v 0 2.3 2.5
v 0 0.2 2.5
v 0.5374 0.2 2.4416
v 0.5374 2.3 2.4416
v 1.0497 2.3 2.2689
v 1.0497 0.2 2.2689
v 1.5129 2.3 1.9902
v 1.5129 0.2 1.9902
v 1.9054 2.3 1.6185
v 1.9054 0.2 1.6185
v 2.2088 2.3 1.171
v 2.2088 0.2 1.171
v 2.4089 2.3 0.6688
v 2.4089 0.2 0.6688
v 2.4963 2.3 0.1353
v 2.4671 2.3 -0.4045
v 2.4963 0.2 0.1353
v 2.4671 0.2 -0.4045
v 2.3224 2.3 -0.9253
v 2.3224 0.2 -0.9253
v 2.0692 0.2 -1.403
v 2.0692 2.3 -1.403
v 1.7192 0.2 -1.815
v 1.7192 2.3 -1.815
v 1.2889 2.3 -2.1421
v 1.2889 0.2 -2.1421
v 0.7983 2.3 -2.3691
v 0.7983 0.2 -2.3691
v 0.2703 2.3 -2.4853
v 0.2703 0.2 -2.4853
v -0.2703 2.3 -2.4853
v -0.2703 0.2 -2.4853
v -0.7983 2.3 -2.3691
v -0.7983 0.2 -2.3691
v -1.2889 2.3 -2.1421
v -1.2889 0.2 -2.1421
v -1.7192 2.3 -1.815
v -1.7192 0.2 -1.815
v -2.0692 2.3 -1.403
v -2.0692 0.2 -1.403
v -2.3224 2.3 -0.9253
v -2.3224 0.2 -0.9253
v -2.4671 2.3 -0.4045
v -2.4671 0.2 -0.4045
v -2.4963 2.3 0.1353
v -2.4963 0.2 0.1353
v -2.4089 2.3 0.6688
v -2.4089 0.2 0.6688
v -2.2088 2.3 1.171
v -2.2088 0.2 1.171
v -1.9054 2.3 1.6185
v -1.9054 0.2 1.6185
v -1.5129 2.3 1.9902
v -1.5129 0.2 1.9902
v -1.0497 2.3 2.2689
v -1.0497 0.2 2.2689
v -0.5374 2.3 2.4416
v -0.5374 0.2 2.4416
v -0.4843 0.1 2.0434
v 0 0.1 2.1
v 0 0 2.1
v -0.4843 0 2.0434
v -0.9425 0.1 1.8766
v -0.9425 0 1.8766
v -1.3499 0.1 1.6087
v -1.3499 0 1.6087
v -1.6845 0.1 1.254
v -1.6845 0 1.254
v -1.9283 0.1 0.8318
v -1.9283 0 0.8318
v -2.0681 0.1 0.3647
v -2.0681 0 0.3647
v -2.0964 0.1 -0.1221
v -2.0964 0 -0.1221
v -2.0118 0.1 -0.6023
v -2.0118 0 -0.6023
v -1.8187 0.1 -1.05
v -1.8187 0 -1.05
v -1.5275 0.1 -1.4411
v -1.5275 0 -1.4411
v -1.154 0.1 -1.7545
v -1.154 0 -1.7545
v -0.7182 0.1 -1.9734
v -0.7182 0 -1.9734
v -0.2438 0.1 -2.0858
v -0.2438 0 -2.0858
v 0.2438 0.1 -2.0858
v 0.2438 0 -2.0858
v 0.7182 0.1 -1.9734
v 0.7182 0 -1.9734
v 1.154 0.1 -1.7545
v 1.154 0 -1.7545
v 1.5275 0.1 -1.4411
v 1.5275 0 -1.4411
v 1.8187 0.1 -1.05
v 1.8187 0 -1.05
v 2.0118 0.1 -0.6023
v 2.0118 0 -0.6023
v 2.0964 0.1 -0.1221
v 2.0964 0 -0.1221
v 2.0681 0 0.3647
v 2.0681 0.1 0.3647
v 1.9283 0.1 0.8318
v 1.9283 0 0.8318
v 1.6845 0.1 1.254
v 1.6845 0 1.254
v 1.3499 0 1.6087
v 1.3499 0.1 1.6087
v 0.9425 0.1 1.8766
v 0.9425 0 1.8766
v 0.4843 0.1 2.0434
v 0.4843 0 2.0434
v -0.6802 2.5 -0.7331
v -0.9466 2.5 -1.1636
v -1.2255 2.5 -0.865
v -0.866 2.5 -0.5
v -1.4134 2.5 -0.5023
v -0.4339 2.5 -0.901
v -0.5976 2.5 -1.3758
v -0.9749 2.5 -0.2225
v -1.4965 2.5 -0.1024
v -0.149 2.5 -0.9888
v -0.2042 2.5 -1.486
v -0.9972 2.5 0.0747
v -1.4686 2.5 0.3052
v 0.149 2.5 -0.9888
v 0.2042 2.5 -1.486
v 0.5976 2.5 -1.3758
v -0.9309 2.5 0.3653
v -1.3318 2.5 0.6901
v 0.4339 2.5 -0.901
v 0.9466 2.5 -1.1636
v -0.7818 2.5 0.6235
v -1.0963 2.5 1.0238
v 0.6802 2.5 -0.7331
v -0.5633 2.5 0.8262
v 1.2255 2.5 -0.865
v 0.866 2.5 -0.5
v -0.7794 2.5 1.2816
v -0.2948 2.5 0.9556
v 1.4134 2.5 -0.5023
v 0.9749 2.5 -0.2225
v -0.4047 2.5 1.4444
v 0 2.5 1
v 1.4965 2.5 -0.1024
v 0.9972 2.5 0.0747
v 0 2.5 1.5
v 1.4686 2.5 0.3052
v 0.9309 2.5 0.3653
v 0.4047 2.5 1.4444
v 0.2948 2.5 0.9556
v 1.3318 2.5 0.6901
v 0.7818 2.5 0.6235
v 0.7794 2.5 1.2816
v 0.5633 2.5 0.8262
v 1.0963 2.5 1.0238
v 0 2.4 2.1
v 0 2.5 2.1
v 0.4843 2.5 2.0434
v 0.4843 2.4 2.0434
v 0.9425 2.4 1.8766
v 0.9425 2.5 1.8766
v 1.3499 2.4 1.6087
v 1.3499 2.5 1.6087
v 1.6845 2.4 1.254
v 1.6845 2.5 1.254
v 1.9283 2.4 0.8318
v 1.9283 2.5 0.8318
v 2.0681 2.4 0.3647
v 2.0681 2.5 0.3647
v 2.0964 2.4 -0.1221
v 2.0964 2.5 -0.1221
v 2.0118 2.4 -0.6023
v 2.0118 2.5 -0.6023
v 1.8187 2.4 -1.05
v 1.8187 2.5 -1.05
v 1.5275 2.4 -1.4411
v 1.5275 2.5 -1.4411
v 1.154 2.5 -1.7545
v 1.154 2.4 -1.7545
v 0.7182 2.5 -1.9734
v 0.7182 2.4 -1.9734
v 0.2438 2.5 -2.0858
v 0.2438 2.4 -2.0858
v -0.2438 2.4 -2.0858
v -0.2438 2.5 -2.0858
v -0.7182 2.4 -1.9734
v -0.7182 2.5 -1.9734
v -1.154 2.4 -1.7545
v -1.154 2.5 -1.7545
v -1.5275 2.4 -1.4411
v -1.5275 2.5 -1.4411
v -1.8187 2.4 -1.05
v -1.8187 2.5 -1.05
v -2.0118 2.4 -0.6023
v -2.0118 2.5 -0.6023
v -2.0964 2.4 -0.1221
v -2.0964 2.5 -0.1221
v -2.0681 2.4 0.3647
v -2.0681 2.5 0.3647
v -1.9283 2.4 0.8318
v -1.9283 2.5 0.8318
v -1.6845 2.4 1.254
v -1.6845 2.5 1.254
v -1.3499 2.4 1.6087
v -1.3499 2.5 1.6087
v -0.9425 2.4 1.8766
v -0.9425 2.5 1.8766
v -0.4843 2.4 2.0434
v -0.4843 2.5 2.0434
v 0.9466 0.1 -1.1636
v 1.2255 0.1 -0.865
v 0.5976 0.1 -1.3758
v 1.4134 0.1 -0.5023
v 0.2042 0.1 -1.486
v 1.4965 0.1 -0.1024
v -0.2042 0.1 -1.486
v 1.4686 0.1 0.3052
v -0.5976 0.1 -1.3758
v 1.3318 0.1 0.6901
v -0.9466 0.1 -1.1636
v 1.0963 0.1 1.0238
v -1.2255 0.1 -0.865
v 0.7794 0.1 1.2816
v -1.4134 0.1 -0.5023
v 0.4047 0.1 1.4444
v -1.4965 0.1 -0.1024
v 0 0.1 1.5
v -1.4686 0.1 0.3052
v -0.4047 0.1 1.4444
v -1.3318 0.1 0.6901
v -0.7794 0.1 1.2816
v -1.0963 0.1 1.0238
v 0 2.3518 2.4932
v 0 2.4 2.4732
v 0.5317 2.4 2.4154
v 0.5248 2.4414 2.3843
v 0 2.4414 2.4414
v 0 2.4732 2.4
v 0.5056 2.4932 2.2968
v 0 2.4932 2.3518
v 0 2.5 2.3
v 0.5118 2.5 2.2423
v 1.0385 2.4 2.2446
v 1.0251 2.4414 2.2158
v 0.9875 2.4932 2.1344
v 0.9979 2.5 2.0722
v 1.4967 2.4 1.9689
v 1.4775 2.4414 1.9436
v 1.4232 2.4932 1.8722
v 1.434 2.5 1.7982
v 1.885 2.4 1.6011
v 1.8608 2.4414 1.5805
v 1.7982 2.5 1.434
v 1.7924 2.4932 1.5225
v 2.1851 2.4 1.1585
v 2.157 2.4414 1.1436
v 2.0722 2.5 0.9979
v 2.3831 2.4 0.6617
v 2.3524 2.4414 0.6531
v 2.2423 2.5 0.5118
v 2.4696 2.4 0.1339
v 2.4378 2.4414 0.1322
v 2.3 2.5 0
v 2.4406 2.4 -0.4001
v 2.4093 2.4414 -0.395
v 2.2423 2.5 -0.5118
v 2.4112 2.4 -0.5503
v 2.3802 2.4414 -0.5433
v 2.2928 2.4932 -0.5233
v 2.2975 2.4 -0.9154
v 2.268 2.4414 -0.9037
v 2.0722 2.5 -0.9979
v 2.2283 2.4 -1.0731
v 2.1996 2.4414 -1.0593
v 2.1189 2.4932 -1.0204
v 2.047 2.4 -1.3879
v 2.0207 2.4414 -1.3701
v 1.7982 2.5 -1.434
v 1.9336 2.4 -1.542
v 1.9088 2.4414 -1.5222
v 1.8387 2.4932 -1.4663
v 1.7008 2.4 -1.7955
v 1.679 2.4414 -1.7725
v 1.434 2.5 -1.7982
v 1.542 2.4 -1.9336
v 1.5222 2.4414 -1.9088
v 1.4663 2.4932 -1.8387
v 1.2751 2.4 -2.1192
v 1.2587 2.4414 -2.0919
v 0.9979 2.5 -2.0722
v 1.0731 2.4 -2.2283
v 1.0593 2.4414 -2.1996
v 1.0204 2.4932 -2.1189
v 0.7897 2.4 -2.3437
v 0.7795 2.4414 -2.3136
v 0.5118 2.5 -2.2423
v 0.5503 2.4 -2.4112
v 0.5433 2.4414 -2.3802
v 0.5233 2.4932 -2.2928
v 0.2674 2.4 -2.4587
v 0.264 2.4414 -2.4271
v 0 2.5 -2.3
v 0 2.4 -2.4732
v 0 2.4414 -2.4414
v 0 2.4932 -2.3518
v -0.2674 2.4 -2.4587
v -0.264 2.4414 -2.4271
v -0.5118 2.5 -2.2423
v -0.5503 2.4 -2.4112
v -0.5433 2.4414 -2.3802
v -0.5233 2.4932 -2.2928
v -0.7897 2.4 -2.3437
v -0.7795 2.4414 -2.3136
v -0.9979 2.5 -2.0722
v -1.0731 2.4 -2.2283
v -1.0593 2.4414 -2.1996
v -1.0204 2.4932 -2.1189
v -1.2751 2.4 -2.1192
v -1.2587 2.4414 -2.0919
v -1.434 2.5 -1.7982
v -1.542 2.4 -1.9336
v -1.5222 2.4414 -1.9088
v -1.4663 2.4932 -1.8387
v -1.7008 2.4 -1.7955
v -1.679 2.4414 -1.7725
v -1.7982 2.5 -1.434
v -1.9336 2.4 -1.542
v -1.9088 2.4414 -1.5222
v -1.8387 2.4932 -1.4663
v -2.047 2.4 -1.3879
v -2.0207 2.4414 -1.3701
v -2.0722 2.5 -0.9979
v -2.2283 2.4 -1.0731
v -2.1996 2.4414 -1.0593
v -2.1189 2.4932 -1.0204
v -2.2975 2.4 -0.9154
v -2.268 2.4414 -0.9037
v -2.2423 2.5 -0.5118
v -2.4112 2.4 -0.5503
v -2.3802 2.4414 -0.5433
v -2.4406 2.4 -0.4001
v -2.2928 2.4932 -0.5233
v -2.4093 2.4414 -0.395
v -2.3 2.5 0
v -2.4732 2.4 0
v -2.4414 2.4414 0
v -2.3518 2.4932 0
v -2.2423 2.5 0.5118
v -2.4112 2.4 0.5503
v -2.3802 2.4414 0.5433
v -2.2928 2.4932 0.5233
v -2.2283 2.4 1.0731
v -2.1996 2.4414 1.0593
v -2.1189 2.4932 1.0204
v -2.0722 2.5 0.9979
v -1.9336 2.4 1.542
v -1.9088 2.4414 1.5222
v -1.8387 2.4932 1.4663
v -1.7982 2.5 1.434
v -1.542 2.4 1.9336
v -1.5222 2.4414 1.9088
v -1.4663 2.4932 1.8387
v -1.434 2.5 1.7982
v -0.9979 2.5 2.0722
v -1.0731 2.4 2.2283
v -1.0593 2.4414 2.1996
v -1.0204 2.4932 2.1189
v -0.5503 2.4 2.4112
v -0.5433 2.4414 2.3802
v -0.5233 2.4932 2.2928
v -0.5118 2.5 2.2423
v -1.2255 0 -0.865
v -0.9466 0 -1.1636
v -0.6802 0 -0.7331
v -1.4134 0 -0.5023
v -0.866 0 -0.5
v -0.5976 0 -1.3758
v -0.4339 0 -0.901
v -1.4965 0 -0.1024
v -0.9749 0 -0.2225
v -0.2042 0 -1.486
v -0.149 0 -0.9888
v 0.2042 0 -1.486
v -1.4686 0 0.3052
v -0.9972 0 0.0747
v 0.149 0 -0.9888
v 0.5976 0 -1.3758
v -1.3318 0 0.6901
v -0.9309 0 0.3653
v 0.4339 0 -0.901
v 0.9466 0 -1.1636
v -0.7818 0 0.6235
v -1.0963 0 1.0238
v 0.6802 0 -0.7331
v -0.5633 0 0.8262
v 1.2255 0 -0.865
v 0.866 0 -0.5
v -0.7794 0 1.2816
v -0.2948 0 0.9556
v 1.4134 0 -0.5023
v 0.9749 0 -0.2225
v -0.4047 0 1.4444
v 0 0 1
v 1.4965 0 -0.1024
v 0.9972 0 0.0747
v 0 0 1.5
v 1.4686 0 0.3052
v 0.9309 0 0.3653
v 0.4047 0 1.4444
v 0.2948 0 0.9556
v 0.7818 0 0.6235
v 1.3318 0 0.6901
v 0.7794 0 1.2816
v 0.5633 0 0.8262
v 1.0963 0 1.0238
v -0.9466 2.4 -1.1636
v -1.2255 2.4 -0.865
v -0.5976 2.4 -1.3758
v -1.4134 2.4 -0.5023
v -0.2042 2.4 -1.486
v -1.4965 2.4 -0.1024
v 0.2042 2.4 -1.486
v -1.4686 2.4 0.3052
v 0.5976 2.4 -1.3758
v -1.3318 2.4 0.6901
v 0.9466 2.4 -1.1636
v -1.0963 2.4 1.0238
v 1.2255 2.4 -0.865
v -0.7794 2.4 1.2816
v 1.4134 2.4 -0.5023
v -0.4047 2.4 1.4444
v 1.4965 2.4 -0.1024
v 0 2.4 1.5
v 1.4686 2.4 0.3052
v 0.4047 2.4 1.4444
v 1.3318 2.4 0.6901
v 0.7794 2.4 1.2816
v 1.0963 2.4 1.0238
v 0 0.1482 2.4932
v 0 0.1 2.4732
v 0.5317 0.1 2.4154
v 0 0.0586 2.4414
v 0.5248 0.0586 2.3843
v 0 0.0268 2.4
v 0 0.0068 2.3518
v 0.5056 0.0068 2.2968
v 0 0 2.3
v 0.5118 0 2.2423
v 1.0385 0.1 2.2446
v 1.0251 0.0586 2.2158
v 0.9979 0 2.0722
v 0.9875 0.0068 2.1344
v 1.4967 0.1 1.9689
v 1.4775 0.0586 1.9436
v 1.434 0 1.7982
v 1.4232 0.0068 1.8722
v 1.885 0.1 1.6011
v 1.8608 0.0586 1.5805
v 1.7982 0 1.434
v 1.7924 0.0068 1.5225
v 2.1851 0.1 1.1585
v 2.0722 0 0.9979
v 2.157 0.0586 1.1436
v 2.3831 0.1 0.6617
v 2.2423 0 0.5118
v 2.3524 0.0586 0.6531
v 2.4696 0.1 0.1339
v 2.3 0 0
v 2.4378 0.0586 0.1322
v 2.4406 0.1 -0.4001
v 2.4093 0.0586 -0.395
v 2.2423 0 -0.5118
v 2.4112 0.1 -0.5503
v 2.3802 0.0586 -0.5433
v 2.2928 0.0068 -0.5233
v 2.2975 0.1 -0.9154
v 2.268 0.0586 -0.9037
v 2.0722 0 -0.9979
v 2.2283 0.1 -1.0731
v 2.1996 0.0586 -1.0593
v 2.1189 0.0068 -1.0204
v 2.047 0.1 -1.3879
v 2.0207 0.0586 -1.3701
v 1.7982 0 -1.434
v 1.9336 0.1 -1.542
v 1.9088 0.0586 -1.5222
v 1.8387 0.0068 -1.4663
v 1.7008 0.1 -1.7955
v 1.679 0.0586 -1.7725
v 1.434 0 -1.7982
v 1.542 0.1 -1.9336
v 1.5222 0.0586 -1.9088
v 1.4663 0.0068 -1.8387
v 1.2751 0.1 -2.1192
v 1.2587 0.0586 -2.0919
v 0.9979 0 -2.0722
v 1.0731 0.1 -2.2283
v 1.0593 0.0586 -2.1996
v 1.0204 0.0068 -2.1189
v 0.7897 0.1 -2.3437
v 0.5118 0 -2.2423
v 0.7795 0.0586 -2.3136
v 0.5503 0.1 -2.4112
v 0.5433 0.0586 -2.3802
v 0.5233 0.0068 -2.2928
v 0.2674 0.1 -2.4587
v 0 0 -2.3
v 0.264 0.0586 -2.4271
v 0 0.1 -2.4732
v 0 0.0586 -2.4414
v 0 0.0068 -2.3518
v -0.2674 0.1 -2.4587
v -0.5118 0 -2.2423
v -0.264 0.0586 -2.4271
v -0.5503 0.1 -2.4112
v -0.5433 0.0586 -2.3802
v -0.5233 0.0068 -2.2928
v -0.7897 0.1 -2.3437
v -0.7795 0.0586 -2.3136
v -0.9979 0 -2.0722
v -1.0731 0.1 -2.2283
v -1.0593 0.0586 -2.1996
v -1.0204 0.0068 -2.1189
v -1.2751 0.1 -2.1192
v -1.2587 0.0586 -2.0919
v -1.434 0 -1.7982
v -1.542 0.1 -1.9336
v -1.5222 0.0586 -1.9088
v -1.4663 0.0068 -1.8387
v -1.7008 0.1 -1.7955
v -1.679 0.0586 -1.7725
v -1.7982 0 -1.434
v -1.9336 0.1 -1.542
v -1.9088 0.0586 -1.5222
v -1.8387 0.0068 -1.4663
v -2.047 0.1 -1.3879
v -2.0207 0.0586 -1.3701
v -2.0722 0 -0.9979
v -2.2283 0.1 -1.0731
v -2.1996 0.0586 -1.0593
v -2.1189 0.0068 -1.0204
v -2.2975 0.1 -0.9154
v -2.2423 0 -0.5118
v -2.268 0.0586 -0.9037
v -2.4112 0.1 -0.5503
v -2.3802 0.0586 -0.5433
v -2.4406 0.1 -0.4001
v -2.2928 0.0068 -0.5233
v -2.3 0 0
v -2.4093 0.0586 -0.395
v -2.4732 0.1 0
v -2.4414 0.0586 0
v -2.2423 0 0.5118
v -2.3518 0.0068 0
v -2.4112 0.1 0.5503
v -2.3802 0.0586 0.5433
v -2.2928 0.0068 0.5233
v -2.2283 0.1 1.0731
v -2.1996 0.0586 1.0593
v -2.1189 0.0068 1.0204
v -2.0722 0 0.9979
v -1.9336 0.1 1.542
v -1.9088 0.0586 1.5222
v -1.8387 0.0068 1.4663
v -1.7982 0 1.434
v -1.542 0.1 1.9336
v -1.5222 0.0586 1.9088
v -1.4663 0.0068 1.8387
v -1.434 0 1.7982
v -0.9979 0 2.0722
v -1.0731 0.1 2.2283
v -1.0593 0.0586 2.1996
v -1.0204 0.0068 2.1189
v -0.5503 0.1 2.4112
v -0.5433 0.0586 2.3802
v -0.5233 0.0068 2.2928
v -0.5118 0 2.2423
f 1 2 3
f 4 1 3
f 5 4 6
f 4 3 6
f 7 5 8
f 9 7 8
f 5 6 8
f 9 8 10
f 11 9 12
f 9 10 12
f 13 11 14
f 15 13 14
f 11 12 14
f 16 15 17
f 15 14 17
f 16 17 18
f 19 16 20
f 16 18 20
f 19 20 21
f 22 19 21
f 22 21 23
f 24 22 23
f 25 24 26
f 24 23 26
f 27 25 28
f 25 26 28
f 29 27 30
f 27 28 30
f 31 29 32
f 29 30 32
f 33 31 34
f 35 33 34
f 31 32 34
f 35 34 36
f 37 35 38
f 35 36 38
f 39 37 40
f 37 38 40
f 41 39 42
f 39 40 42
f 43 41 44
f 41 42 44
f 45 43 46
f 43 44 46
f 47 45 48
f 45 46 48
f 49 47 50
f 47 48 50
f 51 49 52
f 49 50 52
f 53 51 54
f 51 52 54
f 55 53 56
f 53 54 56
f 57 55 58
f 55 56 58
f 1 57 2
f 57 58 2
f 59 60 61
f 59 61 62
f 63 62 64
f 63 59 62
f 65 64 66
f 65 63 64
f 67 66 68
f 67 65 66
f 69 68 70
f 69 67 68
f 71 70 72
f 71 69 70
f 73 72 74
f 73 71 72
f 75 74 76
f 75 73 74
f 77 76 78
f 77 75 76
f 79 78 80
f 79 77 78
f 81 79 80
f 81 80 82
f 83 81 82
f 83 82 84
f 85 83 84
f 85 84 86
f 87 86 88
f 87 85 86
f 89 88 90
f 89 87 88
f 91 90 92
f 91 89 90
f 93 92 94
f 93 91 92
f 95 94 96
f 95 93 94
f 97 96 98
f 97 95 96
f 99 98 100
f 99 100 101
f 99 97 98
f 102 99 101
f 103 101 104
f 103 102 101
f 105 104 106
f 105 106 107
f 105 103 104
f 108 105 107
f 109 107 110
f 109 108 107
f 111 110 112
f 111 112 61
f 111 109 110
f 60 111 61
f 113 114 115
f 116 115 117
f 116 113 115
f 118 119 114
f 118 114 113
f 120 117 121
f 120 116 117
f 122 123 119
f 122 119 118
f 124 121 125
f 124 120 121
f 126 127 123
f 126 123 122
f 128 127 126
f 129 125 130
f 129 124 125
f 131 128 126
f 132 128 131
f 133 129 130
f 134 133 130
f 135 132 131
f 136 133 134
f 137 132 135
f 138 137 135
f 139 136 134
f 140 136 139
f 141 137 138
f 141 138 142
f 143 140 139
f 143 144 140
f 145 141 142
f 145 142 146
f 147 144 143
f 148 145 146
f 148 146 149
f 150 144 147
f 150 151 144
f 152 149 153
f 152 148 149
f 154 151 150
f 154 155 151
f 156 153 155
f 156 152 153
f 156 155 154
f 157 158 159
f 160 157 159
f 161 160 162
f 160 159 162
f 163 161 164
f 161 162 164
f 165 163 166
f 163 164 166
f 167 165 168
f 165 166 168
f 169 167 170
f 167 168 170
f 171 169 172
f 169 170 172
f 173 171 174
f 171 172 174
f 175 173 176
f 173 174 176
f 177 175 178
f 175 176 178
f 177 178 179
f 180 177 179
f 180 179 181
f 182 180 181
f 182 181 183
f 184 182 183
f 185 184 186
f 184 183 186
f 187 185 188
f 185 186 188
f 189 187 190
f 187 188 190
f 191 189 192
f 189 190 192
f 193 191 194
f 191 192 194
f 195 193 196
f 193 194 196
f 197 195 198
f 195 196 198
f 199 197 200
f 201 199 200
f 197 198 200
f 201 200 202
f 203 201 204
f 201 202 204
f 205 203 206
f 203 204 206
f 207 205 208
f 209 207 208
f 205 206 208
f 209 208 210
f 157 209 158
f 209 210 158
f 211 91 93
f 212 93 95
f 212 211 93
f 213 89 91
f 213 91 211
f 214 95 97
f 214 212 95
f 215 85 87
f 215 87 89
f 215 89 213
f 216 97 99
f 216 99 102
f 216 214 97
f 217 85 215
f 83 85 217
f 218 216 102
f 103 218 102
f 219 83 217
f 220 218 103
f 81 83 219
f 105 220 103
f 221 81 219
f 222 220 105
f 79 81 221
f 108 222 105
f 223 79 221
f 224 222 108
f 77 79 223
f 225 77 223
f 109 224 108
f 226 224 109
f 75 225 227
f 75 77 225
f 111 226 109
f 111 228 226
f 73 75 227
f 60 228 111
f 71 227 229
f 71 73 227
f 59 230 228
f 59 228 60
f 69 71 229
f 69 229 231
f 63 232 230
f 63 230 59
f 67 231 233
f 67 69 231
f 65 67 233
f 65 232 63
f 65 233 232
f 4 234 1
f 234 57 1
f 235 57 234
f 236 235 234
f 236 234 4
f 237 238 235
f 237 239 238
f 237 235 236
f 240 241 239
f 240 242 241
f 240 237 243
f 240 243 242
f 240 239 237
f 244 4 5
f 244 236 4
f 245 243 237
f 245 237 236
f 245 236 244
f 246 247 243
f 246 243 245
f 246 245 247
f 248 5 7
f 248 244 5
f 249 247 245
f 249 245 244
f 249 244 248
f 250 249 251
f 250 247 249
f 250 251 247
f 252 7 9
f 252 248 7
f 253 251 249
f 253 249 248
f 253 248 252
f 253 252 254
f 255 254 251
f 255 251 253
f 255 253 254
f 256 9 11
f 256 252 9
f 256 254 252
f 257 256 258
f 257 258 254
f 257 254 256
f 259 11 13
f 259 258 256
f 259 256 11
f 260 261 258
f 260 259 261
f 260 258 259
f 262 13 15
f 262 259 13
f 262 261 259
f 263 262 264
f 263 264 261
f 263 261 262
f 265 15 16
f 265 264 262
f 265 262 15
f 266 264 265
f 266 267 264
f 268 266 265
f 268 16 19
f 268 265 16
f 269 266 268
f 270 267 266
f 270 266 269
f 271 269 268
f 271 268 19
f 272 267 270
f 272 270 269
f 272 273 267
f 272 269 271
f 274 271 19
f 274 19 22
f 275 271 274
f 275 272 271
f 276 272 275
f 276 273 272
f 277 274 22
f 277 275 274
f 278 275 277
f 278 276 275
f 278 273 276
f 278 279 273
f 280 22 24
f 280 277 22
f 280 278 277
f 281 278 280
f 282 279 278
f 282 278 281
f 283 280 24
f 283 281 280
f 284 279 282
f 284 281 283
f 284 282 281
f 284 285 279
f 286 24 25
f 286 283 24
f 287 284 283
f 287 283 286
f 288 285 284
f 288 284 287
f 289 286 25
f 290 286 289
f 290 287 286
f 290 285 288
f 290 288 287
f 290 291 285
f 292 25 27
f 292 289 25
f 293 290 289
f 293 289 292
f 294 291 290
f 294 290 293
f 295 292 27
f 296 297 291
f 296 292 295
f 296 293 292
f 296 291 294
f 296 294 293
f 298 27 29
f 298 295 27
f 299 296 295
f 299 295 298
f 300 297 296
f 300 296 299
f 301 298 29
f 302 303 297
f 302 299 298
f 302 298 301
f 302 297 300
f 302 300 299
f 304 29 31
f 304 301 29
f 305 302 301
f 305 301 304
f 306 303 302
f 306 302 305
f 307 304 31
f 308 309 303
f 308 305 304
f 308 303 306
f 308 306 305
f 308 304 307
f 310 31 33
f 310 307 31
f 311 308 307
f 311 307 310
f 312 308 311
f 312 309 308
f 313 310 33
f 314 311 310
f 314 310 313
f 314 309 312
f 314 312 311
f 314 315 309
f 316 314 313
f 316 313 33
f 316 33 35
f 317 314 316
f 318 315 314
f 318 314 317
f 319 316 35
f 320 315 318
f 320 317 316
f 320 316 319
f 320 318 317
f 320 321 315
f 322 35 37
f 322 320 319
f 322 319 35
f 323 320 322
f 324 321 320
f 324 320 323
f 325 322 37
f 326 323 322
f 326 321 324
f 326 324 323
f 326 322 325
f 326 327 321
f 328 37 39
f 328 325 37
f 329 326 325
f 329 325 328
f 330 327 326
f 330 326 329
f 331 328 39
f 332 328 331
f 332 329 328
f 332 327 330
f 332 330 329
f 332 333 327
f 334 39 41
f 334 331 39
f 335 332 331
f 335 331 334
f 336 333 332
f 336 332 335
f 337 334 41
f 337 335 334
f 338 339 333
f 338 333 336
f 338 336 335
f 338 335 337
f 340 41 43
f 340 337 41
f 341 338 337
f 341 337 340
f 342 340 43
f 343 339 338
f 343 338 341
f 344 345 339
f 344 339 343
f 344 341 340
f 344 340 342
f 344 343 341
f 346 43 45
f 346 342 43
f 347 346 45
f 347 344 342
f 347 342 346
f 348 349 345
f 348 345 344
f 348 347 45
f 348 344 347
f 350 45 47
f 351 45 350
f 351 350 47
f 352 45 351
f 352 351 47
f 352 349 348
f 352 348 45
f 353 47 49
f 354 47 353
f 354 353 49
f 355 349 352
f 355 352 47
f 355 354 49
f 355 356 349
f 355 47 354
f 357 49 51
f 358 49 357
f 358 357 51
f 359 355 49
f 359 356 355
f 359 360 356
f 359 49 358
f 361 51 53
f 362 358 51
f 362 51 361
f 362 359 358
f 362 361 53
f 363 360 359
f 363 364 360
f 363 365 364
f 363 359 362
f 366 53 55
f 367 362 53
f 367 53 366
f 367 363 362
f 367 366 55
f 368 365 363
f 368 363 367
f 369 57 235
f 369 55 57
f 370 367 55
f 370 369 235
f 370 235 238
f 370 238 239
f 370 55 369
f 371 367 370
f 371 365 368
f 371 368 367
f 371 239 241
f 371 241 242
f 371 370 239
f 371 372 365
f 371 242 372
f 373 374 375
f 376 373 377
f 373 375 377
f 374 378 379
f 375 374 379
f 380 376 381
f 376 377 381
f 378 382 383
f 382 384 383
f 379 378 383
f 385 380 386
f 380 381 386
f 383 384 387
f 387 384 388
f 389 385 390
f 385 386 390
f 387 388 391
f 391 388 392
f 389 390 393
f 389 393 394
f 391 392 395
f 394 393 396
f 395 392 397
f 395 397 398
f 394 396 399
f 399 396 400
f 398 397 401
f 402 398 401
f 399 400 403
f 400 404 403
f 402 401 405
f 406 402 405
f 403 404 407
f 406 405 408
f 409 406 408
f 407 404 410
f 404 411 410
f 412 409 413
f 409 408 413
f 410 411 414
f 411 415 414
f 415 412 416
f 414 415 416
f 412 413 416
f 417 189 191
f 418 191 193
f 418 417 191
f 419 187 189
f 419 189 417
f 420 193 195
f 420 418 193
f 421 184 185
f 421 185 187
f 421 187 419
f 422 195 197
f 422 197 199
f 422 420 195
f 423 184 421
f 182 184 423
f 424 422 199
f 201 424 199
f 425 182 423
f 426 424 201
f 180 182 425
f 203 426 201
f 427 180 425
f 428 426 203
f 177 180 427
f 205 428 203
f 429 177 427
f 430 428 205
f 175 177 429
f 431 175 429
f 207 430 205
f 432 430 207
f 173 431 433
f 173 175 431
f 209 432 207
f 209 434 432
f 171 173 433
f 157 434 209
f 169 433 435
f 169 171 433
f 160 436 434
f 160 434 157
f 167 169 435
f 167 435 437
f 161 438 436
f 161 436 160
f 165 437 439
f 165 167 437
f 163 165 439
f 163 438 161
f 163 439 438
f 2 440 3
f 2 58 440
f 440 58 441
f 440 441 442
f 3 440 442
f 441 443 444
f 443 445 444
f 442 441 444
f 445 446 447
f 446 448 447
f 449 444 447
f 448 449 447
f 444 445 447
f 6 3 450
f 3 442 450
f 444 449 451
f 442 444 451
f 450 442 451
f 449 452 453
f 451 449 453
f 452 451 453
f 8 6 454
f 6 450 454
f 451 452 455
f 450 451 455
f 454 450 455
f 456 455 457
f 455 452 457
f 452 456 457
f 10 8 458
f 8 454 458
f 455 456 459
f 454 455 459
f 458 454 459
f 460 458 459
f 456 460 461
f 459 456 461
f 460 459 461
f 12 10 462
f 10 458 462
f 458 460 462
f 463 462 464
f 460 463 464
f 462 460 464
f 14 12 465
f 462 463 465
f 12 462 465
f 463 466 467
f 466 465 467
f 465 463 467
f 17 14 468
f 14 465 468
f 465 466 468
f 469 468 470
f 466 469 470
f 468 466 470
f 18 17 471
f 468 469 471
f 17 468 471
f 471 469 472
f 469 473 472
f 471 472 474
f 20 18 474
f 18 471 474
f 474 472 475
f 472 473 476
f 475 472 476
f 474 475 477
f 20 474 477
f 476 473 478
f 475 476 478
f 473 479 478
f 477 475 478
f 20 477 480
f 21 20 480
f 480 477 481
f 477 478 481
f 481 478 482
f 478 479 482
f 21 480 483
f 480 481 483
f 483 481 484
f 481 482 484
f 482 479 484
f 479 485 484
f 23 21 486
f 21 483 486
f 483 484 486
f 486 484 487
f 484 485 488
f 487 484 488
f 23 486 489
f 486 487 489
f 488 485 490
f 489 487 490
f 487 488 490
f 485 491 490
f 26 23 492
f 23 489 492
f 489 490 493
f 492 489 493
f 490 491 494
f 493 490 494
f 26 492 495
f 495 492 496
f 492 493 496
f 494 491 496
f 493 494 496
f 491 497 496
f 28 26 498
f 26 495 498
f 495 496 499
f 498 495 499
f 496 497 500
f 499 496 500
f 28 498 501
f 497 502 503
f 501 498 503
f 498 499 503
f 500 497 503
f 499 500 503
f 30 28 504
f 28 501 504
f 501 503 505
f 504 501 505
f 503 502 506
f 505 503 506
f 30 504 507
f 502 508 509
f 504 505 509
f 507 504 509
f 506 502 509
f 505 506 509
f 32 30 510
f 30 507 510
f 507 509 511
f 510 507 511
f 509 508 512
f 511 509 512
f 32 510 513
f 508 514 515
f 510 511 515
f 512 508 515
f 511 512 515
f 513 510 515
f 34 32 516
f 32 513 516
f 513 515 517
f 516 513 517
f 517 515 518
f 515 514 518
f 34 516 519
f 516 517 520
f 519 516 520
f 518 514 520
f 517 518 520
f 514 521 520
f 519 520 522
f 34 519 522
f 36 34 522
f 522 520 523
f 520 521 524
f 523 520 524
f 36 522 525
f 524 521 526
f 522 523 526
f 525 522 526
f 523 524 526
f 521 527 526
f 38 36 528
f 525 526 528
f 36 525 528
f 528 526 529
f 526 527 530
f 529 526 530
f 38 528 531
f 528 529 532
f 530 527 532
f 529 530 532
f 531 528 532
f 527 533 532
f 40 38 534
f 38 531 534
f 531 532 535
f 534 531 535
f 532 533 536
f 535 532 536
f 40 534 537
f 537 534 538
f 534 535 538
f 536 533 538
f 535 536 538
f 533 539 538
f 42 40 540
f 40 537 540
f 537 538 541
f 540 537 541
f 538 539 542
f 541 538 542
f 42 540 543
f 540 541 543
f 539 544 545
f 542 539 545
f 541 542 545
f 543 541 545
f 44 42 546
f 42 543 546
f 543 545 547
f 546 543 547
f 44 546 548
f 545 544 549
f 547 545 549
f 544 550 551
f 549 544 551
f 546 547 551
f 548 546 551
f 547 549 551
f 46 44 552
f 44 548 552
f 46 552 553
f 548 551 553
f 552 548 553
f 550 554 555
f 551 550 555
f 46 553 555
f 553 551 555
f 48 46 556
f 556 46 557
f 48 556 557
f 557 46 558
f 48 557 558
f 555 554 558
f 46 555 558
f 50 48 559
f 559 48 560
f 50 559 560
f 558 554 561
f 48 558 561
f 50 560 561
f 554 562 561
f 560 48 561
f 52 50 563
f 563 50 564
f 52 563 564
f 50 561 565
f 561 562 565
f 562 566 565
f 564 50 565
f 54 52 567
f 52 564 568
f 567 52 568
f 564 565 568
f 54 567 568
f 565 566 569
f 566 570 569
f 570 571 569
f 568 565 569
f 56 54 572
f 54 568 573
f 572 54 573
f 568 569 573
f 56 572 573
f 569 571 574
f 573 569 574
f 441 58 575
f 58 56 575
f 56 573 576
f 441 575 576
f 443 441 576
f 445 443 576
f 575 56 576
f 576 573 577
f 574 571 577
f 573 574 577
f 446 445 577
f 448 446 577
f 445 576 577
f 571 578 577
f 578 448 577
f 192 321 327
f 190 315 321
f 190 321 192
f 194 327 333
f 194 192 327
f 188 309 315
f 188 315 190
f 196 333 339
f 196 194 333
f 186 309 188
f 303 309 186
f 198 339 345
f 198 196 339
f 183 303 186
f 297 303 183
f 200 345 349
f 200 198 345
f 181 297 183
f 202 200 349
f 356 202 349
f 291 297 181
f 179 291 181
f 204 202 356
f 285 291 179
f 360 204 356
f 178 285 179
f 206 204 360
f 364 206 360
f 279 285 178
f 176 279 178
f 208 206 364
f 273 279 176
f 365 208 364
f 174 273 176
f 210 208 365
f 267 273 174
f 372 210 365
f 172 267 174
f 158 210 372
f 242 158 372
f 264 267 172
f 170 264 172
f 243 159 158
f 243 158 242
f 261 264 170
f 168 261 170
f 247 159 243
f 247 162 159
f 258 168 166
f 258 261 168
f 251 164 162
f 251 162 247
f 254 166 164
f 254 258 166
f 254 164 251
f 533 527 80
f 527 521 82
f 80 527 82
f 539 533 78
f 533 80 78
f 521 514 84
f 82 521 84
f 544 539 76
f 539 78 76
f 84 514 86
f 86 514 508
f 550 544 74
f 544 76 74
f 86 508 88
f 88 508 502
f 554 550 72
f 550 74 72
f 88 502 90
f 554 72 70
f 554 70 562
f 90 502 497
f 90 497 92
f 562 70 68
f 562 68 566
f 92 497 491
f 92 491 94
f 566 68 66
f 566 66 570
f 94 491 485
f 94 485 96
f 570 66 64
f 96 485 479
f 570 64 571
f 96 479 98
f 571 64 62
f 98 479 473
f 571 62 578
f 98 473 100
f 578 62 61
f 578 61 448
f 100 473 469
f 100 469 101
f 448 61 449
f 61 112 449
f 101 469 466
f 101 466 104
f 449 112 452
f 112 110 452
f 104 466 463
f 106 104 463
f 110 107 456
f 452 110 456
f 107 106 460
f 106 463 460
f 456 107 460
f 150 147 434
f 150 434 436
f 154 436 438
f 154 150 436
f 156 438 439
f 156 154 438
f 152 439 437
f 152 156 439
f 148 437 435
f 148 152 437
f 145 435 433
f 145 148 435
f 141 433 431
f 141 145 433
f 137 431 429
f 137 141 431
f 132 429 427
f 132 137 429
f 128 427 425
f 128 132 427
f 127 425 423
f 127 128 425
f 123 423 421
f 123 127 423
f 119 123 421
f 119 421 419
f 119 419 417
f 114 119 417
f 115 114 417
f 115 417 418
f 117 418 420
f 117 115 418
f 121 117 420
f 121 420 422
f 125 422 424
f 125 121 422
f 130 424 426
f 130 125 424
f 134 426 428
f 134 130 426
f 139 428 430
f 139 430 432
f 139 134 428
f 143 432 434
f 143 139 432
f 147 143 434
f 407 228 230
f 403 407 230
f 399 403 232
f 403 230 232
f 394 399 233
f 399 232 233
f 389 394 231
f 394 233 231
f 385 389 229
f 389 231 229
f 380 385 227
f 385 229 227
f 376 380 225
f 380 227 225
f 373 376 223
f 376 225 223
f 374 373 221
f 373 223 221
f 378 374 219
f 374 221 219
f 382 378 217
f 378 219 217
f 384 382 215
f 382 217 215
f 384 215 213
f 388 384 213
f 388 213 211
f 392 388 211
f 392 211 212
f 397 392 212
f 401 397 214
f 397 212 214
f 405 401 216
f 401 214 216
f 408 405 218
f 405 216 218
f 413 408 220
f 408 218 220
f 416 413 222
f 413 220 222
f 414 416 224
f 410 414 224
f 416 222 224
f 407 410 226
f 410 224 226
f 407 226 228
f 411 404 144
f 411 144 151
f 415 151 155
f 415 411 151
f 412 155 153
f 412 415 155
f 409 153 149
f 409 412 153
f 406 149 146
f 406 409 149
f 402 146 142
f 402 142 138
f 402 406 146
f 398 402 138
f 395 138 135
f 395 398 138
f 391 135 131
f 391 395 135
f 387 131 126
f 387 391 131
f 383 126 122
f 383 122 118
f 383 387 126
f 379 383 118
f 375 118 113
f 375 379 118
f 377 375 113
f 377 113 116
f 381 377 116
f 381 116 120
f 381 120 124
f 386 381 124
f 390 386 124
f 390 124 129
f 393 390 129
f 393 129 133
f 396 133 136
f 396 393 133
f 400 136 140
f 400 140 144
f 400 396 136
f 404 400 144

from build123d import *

# Parameters (mm, degrees)
SKETCH1_R           = 2.5
SKETCH1_R_2         = 1
BOSS_EXTRUDE1_DEPTH = 2.5
FILLET1_R           = 0.2
SKETCH2_R           = 2.1
SKETCH2_R_2         = 1.5
CUT_EXTRUDE1_DEPTH  = 0.1
CUT_EXTRUDE2_START  = -0.1
SKETCH3_R           = 2.1
SKETCH3_R_2         = 1.5
CUT_EXTRUDE2_DEPTH  = 0.1


with BuildPart() as part:
    # Sketch1 → Boss-Extrude1 (new body)
    with BuildSketch(Plane(origin=(0, 0, 0), x_dir=(1, 0, 0), z_dir=(0, 1, 0))):
        with Locations(Location((0, 0, 0), (0, 0, 270))):
            Circle(SKETCH1_R)
        with Locations(Location((0, 0, 0), (0, 0, 270))):
            Circle(SKETCH1_R_2, mode=Mode.SUBTRACT)
    extrude(amount=BOSS_EXTRUDE1_DEPTH)

    # Fillet1
    fillet1_edges = [part.edges().sort_by_distance(p)[0] for p in [
        (0, 0, -2.5),
        (0, 2.5, -2.5),
    ]]
    fillet(fillet1_edges, radius=FILLET1_R)

    # Sketch2 → Cut-Extrude1 (cut)
    with BuildSketch(Plane(origin=(0, 2.5, 0), x_dir=(1, 0, 0), z_dir=(0, 1, 0))):
        with Locations(Location((0, 0, 0), (0, 0, 270))):
            Circle(SKETCH2_R)
        with Locations(Location((0, 0, 0), (0, 0, 270))):
            Circle(SKETCH2_R_2, mode=Mode.SUBTRACT)
    extrude(amount=-CUT_EXTRUDE1_DEPTH, mode=Mode.SUBTRACT)

    # Sketch3 → Cut-Extrude2 (cut)
    with BuildSketch(Plane.XZ.offset(CUT_EXTRUDE2_START)):
        with Locations(Location((0, 0, 0), (0, 0, 90))):
            Circle(SKETCH3_R)
        with Locations(Location((0, 0, 0), (0, 0, 90))):
            Circle(SKETCH3_R_2, mode=Mode.SUBTRACT)
    extrude(amount=CUT_EXTRUDE2_DEPTH, mode=Mode.SUBTRACT)


solid = part.part
